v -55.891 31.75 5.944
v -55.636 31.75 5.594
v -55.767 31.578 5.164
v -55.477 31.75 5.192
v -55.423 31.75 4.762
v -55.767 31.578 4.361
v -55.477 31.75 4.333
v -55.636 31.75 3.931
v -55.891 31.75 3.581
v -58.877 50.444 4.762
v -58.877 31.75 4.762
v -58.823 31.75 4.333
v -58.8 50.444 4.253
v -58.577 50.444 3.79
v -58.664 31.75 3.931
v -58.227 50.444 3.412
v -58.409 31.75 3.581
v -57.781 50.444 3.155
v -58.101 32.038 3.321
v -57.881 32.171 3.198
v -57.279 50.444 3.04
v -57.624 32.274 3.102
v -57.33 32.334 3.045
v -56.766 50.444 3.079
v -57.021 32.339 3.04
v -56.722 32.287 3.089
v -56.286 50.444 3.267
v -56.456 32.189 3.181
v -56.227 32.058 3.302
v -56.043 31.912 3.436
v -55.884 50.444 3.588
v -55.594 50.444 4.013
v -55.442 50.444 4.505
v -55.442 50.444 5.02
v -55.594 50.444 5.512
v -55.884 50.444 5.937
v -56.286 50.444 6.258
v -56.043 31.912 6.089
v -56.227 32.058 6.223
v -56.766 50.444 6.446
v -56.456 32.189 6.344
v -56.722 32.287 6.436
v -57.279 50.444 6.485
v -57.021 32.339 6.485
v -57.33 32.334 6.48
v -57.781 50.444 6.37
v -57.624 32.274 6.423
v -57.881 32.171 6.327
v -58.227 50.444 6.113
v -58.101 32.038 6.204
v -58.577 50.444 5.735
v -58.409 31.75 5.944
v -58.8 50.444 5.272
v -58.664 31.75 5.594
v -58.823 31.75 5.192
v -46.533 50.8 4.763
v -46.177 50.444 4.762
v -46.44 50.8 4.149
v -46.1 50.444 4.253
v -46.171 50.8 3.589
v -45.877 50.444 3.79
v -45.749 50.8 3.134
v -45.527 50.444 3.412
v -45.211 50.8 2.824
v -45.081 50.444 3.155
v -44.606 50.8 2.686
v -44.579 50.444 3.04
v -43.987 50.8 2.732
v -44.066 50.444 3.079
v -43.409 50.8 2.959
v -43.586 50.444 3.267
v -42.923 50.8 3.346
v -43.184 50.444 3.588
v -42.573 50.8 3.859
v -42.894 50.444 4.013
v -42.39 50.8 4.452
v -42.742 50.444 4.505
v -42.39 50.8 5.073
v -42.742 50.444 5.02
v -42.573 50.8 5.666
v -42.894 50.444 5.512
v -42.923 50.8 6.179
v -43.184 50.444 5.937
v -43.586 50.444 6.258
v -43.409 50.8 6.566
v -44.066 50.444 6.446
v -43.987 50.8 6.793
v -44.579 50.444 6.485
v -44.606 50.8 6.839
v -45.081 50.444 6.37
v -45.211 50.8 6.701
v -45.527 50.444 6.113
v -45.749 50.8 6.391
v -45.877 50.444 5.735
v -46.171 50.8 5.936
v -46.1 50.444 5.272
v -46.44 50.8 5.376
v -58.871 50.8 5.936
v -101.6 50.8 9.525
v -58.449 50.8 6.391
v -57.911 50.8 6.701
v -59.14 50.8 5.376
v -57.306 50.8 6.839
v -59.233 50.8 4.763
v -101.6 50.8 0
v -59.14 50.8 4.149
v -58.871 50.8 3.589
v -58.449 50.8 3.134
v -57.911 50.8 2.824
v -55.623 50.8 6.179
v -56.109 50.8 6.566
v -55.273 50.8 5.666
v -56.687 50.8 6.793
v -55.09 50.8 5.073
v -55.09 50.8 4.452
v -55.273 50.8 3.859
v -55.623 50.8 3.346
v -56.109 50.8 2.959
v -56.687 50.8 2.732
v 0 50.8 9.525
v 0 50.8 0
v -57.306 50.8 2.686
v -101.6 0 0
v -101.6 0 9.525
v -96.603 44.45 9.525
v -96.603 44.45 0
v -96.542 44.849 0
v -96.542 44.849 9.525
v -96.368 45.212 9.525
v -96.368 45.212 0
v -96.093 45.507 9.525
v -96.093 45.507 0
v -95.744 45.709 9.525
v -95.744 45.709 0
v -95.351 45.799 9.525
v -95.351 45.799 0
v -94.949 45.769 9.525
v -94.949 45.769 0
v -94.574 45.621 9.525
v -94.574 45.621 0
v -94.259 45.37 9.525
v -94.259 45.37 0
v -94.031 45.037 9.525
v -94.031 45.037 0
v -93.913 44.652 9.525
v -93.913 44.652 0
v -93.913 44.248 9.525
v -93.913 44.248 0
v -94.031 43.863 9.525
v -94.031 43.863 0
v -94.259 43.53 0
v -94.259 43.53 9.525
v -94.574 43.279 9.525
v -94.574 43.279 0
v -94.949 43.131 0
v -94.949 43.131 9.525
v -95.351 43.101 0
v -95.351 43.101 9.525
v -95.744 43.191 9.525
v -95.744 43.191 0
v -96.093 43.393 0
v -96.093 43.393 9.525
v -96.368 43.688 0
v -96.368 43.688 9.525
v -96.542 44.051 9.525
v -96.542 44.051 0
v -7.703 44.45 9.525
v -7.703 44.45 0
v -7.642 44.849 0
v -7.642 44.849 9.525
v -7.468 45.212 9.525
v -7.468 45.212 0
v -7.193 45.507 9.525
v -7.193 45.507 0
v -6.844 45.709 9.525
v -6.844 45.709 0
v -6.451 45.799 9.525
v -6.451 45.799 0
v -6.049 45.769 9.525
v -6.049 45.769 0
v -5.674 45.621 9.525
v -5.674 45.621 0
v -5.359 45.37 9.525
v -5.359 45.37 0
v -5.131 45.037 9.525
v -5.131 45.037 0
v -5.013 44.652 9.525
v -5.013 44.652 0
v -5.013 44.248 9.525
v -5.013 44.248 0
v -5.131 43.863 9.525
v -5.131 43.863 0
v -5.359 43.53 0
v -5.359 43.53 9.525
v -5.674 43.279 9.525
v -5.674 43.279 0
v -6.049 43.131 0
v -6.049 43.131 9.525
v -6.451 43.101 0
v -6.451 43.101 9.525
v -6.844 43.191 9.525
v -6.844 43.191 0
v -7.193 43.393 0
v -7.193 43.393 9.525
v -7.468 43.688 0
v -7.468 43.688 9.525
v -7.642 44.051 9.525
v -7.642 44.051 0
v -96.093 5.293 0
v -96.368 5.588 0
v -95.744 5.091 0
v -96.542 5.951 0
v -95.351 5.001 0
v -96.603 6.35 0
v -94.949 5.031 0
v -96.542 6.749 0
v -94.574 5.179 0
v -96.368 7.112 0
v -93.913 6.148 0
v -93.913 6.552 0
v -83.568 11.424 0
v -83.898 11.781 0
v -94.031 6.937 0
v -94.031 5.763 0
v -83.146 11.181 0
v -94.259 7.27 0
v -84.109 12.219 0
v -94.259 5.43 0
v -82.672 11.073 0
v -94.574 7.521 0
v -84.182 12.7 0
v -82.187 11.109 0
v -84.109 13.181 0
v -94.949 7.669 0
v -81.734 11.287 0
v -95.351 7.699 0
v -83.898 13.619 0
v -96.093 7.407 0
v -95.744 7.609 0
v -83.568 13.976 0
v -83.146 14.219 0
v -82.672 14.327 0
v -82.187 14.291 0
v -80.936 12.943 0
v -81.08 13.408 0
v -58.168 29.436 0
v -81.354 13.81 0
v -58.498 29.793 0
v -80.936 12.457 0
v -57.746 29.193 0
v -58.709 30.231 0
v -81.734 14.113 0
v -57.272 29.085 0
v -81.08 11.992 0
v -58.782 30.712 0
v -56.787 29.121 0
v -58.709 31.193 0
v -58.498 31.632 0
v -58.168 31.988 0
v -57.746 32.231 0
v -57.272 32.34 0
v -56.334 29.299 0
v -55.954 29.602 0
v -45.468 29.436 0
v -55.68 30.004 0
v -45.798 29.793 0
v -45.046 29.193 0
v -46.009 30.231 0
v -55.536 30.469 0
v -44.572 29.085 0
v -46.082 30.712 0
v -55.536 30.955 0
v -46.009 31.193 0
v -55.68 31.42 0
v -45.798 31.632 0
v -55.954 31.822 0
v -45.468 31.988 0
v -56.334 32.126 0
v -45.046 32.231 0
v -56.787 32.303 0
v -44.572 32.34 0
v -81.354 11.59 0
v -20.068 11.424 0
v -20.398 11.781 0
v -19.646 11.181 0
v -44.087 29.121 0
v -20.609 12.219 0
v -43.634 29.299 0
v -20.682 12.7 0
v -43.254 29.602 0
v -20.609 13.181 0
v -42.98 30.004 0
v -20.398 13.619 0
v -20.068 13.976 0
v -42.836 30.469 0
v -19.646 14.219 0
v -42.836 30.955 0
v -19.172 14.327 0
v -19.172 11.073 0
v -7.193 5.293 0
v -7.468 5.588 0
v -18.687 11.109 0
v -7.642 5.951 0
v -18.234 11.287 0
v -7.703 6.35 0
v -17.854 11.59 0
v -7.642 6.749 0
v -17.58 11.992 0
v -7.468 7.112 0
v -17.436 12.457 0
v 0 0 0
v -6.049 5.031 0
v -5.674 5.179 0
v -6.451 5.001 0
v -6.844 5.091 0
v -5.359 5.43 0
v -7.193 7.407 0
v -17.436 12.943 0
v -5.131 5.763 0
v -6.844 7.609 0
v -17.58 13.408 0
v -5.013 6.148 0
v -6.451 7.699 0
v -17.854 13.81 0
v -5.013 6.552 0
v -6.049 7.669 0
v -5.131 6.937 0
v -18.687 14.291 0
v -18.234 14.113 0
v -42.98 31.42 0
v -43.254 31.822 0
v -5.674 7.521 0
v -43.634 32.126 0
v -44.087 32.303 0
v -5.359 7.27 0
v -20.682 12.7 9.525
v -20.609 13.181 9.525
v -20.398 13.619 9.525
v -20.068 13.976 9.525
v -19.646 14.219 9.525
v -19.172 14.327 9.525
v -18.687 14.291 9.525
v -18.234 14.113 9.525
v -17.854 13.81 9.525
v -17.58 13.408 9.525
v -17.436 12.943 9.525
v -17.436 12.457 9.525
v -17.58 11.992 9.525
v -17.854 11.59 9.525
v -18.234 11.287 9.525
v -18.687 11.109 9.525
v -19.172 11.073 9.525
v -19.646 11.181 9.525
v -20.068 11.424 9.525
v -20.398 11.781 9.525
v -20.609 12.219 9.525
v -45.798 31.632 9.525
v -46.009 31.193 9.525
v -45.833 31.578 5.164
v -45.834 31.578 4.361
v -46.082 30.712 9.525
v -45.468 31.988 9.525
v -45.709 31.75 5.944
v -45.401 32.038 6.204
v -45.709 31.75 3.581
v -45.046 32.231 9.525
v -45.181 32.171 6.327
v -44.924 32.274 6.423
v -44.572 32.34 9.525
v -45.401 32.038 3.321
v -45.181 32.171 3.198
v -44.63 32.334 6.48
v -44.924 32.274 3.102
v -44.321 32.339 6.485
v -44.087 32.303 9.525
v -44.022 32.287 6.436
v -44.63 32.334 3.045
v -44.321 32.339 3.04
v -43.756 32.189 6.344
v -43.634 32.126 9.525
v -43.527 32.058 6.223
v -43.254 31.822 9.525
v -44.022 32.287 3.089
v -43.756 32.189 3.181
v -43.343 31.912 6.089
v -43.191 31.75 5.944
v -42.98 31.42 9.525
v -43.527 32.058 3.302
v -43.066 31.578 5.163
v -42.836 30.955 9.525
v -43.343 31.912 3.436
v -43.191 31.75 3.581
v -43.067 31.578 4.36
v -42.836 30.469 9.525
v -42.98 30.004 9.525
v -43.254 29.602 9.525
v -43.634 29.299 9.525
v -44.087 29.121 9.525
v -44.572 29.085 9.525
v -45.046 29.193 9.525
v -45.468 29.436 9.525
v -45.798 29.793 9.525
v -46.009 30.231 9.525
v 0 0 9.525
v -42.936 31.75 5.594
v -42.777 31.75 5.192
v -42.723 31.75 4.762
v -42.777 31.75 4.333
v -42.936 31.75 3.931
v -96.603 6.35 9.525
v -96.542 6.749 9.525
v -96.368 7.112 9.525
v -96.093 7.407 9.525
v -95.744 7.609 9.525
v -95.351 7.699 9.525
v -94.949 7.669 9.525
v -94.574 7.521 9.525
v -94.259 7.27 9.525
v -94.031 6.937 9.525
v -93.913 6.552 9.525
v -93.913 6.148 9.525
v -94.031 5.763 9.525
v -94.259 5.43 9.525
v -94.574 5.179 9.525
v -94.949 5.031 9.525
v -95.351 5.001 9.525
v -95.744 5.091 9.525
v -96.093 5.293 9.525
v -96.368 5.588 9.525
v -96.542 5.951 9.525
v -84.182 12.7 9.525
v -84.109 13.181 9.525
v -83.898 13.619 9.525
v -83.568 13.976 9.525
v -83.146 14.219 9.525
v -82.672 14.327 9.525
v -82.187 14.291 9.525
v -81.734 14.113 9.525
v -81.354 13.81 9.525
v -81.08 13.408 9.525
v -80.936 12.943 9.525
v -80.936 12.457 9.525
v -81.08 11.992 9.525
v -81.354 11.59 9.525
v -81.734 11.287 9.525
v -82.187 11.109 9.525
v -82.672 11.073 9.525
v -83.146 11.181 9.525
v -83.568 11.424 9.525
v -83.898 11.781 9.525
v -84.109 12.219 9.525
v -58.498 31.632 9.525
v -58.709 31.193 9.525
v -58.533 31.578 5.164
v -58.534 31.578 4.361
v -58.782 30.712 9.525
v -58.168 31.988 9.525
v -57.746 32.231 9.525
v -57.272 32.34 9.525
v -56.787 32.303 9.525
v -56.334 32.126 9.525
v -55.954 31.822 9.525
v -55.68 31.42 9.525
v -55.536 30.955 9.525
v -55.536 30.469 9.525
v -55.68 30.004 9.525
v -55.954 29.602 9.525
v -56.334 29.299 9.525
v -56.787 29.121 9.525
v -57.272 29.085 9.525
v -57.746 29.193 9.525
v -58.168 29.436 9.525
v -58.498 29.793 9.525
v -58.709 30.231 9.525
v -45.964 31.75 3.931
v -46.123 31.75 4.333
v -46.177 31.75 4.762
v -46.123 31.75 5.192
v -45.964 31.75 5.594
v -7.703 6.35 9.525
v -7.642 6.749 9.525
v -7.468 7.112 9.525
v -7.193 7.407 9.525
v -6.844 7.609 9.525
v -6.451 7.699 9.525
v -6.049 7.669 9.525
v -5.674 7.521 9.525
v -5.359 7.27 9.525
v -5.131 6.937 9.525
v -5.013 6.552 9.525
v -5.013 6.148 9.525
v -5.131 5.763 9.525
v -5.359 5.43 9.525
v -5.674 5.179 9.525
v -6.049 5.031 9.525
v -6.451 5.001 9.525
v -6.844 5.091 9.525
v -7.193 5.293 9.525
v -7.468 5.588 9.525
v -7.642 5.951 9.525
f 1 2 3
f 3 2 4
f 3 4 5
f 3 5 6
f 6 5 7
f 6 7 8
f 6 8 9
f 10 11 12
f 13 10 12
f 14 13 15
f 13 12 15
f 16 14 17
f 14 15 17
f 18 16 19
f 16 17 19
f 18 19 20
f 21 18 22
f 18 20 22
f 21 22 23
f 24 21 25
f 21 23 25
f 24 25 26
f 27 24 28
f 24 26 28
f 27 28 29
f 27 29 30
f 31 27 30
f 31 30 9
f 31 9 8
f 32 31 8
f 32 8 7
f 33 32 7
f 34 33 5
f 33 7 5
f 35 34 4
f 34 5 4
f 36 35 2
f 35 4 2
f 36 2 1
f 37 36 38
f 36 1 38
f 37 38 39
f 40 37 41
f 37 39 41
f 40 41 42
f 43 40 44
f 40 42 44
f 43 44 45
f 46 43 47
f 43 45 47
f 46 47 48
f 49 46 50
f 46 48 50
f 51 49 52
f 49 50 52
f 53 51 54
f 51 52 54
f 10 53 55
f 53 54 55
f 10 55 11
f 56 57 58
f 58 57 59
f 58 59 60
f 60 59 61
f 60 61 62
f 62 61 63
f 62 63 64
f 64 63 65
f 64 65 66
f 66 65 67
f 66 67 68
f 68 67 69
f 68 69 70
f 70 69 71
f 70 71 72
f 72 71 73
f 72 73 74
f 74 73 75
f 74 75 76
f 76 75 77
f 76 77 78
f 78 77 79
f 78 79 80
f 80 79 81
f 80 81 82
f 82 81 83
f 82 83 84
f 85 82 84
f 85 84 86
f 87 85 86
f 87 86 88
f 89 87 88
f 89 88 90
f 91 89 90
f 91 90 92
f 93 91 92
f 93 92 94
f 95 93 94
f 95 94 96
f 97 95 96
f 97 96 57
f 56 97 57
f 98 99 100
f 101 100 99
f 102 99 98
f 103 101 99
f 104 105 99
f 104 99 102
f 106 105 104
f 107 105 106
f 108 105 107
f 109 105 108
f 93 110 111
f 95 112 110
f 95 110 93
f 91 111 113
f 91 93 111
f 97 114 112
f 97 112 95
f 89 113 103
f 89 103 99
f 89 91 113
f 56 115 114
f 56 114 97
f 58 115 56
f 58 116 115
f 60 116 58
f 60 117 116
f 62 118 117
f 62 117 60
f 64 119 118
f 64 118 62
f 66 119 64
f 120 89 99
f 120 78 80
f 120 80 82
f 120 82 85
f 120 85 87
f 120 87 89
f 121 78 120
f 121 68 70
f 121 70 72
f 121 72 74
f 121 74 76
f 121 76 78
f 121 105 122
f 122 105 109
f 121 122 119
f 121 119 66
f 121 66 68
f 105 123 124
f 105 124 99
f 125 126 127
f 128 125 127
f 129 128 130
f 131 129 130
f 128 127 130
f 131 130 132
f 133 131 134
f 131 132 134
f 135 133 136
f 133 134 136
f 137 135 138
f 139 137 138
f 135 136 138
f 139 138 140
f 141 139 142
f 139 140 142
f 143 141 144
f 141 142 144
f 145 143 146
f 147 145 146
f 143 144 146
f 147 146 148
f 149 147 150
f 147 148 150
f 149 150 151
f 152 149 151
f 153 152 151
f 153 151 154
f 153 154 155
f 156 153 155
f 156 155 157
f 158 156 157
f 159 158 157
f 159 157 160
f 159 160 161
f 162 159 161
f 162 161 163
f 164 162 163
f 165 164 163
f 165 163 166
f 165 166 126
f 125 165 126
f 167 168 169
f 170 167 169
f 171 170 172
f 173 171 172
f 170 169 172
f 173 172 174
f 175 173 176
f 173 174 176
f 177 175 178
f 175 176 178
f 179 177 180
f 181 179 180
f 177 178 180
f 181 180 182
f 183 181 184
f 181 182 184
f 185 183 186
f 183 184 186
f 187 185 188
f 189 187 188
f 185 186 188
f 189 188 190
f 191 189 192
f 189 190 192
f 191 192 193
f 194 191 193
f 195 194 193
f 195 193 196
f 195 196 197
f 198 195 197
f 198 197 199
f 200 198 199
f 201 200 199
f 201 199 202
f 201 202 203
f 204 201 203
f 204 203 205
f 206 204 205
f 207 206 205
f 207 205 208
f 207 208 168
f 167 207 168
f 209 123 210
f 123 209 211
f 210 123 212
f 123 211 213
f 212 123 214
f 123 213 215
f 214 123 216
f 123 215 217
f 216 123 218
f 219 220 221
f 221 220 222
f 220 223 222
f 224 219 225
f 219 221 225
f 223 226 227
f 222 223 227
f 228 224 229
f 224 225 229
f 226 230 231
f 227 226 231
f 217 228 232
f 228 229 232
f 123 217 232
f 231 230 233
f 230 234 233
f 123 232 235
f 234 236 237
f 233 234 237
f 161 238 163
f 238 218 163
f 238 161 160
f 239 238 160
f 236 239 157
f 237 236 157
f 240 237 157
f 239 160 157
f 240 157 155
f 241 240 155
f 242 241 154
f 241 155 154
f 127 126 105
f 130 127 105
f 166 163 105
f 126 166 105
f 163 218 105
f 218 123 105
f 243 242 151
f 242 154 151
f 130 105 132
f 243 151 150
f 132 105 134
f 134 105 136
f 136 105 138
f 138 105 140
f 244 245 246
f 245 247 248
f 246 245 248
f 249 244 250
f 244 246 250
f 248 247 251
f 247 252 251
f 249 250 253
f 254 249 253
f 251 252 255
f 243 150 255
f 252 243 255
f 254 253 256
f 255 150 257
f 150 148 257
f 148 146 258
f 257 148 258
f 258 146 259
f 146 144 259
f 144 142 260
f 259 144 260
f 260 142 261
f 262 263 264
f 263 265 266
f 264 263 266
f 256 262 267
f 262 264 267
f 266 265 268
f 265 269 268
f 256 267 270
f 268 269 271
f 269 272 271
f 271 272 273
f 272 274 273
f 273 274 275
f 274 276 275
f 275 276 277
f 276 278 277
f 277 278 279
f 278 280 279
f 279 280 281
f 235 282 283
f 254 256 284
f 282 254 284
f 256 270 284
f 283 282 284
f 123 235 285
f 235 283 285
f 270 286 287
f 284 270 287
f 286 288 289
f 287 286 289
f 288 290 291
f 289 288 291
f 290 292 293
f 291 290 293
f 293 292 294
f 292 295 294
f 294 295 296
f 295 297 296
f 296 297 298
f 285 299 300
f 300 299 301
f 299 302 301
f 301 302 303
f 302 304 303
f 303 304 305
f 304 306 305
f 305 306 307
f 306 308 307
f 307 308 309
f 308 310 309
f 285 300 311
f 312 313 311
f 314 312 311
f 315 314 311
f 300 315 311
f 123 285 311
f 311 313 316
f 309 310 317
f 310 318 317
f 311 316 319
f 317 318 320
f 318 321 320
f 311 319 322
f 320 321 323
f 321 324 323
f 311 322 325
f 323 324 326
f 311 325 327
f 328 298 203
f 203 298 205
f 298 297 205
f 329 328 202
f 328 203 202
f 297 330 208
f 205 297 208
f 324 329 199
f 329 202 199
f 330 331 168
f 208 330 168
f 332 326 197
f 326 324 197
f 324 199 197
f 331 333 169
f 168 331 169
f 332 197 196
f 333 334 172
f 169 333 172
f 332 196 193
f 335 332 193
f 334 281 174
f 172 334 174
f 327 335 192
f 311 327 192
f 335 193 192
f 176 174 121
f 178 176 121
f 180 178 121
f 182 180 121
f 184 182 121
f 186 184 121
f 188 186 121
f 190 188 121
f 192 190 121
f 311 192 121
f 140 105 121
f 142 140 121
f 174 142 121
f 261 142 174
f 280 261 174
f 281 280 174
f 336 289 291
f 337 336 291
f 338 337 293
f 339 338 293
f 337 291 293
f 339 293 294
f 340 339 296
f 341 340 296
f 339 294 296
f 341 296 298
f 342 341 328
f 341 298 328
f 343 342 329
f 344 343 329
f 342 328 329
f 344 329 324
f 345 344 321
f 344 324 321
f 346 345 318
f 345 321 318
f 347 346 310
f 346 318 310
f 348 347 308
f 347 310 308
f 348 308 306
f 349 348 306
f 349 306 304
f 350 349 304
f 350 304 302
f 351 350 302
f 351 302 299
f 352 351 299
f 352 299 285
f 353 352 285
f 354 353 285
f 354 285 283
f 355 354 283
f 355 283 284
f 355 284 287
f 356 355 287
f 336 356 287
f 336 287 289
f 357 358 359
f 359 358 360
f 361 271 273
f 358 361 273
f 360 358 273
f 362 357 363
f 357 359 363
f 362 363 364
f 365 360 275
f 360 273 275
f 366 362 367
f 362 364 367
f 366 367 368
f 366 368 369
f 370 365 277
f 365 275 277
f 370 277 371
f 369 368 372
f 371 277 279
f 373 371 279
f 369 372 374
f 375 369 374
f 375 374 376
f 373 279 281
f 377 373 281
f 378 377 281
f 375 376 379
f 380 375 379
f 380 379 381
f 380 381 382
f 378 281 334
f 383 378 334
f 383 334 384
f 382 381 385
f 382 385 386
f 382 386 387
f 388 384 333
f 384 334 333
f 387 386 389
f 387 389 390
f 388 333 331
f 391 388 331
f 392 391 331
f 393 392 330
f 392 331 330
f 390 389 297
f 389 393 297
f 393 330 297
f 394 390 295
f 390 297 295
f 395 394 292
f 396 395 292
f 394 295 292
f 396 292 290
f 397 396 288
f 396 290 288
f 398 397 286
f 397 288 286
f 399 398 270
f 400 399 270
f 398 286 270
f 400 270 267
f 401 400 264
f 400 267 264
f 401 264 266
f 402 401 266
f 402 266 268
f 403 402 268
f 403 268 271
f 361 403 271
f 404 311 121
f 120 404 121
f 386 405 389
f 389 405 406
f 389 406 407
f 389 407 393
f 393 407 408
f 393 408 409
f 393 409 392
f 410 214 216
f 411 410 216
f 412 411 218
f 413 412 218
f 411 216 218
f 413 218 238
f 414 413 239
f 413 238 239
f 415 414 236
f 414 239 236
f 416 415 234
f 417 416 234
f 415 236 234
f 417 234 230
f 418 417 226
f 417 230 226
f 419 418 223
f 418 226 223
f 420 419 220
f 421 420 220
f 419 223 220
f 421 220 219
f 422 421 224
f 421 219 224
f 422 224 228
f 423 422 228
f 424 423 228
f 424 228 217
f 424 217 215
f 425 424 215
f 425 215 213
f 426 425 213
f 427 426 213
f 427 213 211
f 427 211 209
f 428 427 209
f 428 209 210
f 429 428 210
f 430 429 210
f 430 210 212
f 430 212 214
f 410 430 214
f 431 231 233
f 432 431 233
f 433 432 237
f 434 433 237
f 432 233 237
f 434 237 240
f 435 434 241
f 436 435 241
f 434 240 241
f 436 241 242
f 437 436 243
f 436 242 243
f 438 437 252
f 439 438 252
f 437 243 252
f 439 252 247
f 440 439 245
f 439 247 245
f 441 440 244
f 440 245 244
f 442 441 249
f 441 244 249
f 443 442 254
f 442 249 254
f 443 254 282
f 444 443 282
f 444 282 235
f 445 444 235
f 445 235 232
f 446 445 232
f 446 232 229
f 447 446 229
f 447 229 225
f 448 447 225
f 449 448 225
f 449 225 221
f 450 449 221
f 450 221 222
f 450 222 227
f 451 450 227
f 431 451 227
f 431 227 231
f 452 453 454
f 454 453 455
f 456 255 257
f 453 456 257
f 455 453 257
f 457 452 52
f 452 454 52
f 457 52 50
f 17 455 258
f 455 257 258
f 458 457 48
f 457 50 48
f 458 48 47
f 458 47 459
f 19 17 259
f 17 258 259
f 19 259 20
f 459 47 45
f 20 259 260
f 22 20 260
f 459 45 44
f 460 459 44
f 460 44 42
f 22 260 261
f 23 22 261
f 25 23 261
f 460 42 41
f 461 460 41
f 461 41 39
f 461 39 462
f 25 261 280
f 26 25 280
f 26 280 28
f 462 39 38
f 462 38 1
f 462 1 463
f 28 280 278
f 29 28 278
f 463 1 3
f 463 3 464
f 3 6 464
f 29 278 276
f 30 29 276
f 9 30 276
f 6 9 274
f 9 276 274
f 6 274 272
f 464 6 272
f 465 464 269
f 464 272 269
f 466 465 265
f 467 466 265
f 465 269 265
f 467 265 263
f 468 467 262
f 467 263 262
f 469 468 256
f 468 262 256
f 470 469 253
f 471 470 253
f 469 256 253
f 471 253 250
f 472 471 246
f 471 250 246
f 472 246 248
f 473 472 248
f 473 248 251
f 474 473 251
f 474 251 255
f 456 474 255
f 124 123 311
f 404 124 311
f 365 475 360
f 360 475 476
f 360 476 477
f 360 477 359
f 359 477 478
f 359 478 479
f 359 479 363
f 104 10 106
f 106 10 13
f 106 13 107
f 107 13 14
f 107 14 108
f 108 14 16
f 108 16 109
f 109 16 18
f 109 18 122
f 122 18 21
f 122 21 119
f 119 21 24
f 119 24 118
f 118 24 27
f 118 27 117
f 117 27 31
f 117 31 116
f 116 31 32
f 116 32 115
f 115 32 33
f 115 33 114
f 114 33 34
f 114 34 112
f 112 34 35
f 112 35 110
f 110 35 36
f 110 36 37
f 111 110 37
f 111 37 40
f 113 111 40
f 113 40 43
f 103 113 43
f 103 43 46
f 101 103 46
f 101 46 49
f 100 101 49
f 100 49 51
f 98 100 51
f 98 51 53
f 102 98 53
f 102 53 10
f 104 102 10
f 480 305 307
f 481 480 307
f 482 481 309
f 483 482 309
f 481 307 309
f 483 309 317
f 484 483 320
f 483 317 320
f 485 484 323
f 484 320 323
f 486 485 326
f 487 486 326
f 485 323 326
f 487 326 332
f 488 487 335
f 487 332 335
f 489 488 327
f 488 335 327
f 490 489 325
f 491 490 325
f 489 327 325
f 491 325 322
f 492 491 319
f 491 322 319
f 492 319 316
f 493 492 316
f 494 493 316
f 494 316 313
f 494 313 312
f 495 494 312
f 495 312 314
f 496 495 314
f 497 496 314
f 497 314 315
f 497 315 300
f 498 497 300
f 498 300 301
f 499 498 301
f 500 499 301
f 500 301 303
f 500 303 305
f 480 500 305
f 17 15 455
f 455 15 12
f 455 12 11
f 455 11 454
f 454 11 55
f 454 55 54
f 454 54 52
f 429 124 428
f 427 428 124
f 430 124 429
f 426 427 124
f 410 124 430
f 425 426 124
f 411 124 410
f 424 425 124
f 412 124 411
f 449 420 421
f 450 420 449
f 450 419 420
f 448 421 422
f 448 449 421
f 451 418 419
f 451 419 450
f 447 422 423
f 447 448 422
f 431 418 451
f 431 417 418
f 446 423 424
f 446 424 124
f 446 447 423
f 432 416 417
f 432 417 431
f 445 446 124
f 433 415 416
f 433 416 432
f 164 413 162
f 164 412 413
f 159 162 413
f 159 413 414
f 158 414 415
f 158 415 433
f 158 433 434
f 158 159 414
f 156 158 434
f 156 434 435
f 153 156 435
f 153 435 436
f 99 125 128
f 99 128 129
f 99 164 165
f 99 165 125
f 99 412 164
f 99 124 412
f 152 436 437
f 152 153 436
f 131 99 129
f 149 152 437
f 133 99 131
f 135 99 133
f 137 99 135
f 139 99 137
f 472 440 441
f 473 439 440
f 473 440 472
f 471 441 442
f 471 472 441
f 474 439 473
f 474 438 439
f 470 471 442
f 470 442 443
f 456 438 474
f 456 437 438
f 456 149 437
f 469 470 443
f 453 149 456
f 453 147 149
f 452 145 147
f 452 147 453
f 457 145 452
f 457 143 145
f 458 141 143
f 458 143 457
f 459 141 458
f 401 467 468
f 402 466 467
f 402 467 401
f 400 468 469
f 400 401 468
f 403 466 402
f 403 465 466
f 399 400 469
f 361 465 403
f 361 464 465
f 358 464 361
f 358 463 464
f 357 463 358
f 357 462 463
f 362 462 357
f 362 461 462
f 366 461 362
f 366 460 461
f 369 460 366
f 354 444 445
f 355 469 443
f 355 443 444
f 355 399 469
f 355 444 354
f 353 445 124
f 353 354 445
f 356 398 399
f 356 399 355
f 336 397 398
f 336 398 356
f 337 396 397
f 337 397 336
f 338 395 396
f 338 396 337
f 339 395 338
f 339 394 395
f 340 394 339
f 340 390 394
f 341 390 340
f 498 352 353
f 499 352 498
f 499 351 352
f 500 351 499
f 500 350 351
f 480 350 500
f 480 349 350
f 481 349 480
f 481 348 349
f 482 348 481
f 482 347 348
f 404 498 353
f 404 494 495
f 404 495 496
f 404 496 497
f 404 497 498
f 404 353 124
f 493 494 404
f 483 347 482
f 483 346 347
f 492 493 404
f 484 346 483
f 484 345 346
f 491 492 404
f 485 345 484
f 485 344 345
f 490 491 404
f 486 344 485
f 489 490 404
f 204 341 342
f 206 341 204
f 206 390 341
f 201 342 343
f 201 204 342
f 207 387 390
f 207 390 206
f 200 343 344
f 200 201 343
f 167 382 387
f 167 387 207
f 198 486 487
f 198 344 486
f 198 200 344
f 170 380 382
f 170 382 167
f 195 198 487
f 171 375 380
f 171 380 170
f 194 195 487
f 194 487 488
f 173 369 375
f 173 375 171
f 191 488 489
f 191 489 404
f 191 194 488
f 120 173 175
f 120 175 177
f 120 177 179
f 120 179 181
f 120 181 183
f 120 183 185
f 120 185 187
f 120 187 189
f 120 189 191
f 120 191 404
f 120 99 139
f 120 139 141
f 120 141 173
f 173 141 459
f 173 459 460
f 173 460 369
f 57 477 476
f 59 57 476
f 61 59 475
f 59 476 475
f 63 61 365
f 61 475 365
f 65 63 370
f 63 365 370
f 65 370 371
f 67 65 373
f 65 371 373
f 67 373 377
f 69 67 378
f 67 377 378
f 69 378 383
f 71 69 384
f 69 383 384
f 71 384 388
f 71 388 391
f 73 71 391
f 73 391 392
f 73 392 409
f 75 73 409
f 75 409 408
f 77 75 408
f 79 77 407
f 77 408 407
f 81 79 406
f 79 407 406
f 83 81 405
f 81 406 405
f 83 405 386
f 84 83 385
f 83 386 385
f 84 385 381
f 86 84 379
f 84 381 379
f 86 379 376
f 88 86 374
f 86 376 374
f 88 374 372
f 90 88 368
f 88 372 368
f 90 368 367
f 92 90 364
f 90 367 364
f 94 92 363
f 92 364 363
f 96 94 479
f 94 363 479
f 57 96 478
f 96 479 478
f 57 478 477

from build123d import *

# Parameters (mm, degrees)
SKETCH1_W                       = 101.6
SKETCH1_H                       = 50.8
BOSS_EXTRUDE1_DEPTH             = 9.525
F_8_32_TAPPED_HOLE1_D           = 3.4544
F_8_32_TAPPED_HOLE1_DEPTH       = 19.05
F_8_32_TAPPED_HOLE1_CSINK_D     = 4.1656
F_8_32_TAPPED_HOLE1_CSINK_ANGLE = 90
F_8_32_TAPPED_HOLE1_TIP         = 1.037806461
F_4_CLEARANCE_HOLE2_D           = 3.2639
F_4_CLEARANCE_HOLE2_DEPTH       = 25.4
F_4_CLEARANCE_HOLE2_TIP         = 0.980574487
F_6_32_TAPPED_HOLE1_D           = 2.7051
F_4_CLEARANCE_HOLE1_D           = 3.2639
F_4_CLEARANCE_HOLE1_DEPTH       = 9.525


with BuildPart() as part:
    # Sketch1 → Boss-Extrude1 (new body)
    with BuildSketch(Plane.XY):
        with Locations((-50.8, 25.4)):
            Rectangle(SKETCH1_W, SKETCH1_H)
    extrude(amount=BOSS_EXTRUDE1_DEPTH)

    # #8-32 Tapped Hole1
    with Locations(Plane(origin=(0, 50.8, 0), x_dir=(1, 0, 0), z_dir=(0, 1, 0))):
        with Locations((-44.45, -4.7625), (-57.15, -4.7625)):
            CounterSinkHole(F_8_32_TAPPED_HOLE1_D / 2, F_8_32_TAPPED_HOLE1_CSINK_D / 2, depth=F_8_32_TAPPED_HOLE1_DEPTH, counter_sink_angle=F_8_32_TAPPED_HOLE1_CSINK_ANGLE)
            with Locations((0, 0, -(F_8_32_TAPPED_HOLE1_DEPTH + F_8_32_TAPPED_HOLE1_TIP / 2))):  # 118° drill point
                Cone(0, F_8_32_TAPPED_HOLE1_D / 2, F_8_32_TAPPED_HOLE1_TIP, mode=Mode.SUBTRACT)

    # #4 Clearance Hole2
    with Locations(Plane.XY.offset(9.525)):
        with Locations((-44.45, 30.712193539), (-57.15, 30.712193539)):
            Hole(F_4_CLEARANCE_HOLE2_D / 2, depth=F_4_CLEARANCE_HOLE2_DEPTH)
            with Locations((0, 0, -(F_4_CLEARANCE_HOLE2_DEPTH + F_4_CLEARANCE_HOLE2_TIP / 2))):  # 118° drill point
                Cone(0, F_4_CLEARANCE_HOLE2_D / 2, F_4_CLEARANCE_HOLE2_TIP, mode=Mode.SUBTRACT)

    # #6-32 Tapped Hole1 (through all)
    with Locations(Plane.XY.offset(9.525)):
        with Locations((-95.25, 6.35), (-95.25, 44.45), (-6.35, 6.35), (-6.35, 44.45)):
            Hole(F_6_32_TAPPED_HOLE1_D / 2)

    # #4 Clearance Hole1
    with Locations(Plane.XY.offset(9.525)):
        with Locations((-82.55, 12.7), (-19.05, 12.7)):
            Hole(F_4_CLEARANCE_HOLE1_D / 2, depth=F_4_CLEARANCE_HOLE1_DEPTH)


solid = part.part
